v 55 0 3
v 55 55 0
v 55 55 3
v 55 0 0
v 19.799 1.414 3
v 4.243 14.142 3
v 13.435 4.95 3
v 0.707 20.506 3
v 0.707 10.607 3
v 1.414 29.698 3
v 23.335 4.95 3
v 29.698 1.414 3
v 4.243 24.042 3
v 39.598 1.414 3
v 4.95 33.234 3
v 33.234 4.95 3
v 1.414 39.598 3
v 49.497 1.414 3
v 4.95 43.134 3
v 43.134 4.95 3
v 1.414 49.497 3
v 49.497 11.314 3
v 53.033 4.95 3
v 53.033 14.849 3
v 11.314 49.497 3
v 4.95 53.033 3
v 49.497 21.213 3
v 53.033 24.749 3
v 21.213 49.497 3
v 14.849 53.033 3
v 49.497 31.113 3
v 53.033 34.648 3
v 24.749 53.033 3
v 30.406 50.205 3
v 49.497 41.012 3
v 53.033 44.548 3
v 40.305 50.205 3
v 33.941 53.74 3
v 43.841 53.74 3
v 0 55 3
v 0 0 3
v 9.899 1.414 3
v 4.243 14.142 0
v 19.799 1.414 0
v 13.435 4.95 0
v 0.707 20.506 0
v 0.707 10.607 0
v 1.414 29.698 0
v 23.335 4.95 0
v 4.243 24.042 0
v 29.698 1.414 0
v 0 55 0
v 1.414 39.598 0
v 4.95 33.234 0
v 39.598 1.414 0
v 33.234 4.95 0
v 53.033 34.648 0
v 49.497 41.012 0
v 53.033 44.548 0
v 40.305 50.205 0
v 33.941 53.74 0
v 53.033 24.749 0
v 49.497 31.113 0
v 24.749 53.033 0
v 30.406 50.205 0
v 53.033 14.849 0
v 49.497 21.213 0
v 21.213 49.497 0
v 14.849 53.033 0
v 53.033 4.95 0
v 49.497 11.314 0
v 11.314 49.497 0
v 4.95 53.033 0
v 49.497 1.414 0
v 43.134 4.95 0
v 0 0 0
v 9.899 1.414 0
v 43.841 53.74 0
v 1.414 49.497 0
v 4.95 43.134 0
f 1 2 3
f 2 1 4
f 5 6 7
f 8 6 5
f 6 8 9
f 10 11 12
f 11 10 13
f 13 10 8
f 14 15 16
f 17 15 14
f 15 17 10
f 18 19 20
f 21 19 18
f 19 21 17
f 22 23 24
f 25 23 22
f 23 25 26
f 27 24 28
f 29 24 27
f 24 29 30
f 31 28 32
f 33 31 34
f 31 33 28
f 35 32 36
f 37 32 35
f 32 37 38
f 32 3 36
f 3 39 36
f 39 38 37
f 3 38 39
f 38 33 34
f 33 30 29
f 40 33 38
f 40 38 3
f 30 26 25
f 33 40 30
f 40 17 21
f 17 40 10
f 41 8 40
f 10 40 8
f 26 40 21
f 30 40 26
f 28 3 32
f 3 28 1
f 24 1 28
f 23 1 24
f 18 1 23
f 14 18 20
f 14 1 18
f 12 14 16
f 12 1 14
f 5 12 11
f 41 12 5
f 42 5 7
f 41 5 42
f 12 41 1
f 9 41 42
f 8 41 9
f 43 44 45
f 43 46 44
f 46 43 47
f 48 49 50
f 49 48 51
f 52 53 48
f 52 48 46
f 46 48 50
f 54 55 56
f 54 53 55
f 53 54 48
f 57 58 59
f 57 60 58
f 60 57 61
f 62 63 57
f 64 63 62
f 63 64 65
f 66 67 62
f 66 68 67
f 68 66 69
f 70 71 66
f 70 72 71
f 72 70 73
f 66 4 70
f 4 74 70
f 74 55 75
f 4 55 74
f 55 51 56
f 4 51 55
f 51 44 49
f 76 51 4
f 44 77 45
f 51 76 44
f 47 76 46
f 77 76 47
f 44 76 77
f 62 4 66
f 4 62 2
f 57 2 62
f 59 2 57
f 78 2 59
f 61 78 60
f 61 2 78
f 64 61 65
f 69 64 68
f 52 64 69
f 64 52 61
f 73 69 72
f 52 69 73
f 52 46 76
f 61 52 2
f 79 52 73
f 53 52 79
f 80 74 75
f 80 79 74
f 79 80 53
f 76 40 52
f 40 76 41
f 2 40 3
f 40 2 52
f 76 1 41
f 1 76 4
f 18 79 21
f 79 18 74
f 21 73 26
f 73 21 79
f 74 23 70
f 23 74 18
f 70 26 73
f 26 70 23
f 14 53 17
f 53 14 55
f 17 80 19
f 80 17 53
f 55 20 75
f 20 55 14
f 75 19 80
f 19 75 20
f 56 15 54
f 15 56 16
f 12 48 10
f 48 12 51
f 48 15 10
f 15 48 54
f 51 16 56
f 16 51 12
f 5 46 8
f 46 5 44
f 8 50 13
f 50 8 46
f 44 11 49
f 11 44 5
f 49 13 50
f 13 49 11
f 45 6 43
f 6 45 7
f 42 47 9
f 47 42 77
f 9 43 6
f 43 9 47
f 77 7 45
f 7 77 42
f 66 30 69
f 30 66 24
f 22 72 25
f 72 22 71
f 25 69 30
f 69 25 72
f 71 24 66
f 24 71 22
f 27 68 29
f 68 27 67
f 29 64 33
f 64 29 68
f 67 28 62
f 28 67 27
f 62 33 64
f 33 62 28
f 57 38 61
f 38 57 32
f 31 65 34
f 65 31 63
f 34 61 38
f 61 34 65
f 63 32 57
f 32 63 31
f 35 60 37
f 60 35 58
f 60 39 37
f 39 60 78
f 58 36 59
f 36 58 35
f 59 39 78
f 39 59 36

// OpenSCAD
w = 55;
h = 55;
d = 3;

hw=5;
hw_gap=3;
count=w / (hw + hw_gap);

difference(){
cube([w, h, d]);
rotate([0, 0, 45]) {  
    color("green")
    translate([36,-34, -1])
    cube([hw,h+13,d+2]);
}
difference(){
rotate([0, 0 , 45]) {  
    color("red")
    translate([29,-27, -1])
    cube([hw,h-1,d+2]);
}
}
difference(){
rotate([0, 0 , 45]) {  
    color("red")
    translate([22,-20, -1])
    cube([hw,h-15,d+2]);
}
}
difference(){
rotate([0, 0 , 45]) {  
    color("red")
    translate([15,-13, -1])
    cube([hw,h-28,d+2]);
}
}
difference(){
rotate([0, 0 , 45]) {  
    color("red")
    translate([8,-6, -1])
    cube([hw,h-42,d+2]);
}
}
difference(){
rotate([0, 0 , 45]) {  
    color("green")
    translate([43,-27, -1])
    cube([hw,h-1,d+2]);
}
}
difference(){
rotate([0, 0 , 45]) {  
    color("green")
    translate([50,-20, -1])
    cube([hw,h-15,d+2]);
}
}
difference(){
rotate([0, 0 , 45]) {  
    color("green")
    translate([57,-13, -1])
    cube([hw,h-28,d+2]);
}
}
difference(){
rotate([0, 0 , 45]) {  
    color("green")
    translate([64,-6, -1])
    cube([hw,h-42,d+2]);
}
}
}
